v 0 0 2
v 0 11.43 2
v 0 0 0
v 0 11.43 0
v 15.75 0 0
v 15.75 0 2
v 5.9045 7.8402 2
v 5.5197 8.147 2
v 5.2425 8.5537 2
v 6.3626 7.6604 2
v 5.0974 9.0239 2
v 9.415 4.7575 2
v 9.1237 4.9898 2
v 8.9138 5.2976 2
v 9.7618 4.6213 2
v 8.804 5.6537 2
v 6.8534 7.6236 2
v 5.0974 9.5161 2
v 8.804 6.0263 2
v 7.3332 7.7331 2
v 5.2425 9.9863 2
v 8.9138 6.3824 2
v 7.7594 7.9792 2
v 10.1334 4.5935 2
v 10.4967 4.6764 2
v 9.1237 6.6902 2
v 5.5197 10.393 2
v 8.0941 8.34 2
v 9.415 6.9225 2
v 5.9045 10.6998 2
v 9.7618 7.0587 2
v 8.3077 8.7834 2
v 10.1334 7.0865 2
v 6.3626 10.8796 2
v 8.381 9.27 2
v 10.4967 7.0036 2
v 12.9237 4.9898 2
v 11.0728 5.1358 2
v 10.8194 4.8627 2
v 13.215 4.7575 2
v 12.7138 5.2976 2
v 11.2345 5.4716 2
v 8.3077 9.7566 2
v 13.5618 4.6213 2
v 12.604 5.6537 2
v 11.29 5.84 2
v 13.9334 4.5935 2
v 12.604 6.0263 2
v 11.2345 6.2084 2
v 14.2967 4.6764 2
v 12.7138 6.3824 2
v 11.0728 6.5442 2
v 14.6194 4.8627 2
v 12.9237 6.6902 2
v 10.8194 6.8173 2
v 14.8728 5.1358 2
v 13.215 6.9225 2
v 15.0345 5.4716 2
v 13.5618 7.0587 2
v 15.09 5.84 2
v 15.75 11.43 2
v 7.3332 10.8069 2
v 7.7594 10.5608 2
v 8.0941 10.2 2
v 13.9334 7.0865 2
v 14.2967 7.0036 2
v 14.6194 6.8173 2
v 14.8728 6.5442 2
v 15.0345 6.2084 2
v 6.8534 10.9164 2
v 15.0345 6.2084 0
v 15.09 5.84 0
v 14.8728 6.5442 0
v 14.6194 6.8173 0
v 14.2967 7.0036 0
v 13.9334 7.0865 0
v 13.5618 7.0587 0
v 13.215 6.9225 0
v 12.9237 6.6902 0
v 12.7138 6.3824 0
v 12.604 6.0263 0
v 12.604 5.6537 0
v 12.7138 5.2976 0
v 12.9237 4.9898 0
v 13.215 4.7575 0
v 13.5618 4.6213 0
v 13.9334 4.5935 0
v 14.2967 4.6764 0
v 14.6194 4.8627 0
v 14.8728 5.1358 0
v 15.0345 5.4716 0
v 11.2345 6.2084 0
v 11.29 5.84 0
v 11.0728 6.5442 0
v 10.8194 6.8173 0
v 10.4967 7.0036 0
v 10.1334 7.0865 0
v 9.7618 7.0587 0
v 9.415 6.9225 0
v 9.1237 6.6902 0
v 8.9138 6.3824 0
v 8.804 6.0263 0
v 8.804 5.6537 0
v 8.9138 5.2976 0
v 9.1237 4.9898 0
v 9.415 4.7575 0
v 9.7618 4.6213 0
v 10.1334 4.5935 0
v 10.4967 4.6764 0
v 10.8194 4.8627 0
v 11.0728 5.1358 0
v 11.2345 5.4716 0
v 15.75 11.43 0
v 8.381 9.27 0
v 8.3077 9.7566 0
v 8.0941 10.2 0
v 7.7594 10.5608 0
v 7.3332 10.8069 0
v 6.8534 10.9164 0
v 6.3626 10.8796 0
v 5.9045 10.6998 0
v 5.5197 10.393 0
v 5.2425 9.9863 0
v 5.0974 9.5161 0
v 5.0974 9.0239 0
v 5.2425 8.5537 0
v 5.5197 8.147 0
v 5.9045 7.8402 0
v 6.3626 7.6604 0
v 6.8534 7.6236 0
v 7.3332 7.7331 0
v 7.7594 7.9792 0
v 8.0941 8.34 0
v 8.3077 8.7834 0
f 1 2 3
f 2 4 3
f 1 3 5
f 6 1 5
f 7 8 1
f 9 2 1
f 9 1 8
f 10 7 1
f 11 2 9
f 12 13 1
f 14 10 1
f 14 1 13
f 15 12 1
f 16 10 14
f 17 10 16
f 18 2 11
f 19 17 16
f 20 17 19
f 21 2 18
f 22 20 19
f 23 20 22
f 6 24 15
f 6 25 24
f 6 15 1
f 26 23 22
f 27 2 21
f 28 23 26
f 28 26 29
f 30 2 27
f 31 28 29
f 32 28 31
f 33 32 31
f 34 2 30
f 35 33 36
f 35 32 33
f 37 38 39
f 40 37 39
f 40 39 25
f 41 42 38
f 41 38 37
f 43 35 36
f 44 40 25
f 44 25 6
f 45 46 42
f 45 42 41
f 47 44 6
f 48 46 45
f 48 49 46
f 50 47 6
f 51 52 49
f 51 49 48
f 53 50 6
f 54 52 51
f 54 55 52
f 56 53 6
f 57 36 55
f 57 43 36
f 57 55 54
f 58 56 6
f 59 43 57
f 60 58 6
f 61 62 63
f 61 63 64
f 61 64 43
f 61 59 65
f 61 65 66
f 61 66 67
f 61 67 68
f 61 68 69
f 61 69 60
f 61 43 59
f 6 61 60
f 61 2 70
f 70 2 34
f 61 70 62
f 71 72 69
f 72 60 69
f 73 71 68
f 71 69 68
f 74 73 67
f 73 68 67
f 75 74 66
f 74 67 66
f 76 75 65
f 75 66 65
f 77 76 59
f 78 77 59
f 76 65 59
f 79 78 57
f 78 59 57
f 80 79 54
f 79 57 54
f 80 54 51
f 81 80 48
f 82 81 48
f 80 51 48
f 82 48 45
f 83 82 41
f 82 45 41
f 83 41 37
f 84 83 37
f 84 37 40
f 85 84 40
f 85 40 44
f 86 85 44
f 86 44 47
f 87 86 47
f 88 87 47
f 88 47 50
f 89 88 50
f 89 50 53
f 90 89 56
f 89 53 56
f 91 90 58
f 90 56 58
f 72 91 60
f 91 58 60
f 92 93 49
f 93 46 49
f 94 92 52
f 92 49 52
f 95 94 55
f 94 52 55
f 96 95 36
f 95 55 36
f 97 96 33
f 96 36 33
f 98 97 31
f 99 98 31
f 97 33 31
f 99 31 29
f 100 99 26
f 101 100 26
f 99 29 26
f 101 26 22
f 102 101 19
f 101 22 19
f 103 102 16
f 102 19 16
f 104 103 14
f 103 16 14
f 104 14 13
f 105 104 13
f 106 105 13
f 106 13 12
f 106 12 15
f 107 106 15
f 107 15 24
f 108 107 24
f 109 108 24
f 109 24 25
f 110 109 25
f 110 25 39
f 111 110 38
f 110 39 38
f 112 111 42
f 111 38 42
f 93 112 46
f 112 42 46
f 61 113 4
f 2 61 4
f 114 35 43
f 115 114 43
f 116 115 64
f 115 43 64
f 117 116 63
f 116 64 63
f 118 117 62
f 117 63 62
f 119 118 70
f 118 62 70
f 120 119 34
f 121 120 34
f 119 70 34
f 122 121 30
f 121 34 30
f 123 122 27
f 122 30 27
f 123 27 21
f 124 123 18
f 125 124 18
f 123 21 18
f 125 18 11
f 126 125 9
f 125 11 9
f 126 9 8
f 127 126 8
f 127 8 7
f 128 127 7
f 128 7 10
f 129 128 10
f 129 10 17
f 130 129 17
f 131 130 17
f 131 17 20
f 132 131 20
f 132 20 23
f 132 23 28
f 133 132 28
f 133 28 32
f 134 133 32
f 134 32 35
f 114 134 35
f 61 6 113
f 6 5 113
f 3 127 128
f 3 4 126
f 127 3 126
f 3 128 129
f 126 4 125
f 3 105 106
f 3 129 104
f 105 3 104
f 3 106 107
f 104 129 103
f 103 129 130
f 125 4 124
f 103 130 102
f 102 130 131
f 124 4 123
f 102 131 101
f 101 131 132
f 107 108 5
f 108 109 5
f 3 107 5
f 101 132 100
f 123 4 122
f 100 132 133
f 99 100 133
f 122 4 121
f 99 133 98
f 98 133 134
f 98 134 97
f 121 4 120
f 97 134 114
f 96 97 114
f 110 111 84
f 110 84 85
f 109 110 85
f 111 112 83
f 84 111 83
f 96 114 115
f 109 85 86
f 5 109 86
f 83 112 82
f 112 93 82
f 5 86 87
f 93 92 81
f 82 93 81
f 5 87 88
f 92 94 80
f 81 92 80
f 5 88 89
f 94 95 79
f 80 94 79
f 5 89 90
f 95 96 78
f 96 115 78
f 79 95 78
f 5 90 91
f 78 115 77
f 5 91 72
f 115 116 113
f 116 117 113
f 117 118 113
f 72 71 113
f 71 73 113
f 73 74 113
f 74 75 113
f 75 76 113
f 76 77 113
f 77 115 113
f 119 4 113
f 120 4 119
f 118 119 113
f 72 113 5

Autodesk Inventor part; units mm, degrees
ref_plane "YZ Plane" through (0, 0, 0) normal (1, 0, 0) x (0, 1, 0)
ref_plane "XZ Plane" through (0, 0, 0) normal (0, 1, 0) x (-1, 0, 0)
ref_plane "XY Plane" through (0, 0, 0) normal (0, 0, 1) x (1, 0, 0)
sketch "Sketch1" plane through (0, 0, 0) normal (0, 0, 1) x (1, 0, 0)
  point P0 (0, 0)
sketch "Sketch2" plane through (0, 0, 0) normal (0, 0, 1) x (1, 0, 0)
  line L0 (0, 0) -> (15.75, 0)
  line L1 (15.75, 0) -> (15.75, 11.43)
  line L2 (15.75, 11.43) -> (0, 11.43)
  line L3 (0, 11.43) -> (0, 0)
  dimension "d0" = 15.75
  dimension "d1" = 11.43
extrude "Extrusion1" add sketch "Sketch2" along normal blind 2
sketch "Sketch3" plane through (0, 0, 2) normal (0, 0, 1) x (1, 0, 0)
  line L0 (15.75, 11.43) -> (0, 11.43) projected
  line L1 (0, 11.43) -> (6.73, 11.43)
  line L2 (0, 11.43) -> (6.73, 11.43) construction
  line L3 (6.73, 11.43) -> (6.73, 9.27)
  circle A0 centre (6.73, 9.27) radius 1.651
  line L4 (15.75, 11.43) -> (13.84, 11.43)
  line L5 (15.75, 11.43) -> (17.66, 11.43) construction
  line L6 (13.84, 11.43) -> (13.84, 5.84)
  line L7 (13.84, 5.84) -> (10.04, 5.84)
  circle A1 centre (10.04, 5.84) radius 1.25
  circle A2 centre (13.84, 5.84) radius 1.25
  point P0 (0, 0)
  dimension "d4" = 6.73
  dimension "d5" = 0
  dimension "d6" = 2.16
  dimension "d7" = 90
  dimension "d8" = 3.302
  dimension "d9" = 1.91
  dimension "d10" = 180
  dimension "d11" = 5.59
  dimension "d12" = 90
  dimension "d13" = 3.8
  dimension "d14" = 90
  dimension "d15" = 2.5
  dimension "d16" = 2.5
extrude "Extrusion2" cut sketch "Sketch3" against normal blind 2
properties part number "SensorPCB"
